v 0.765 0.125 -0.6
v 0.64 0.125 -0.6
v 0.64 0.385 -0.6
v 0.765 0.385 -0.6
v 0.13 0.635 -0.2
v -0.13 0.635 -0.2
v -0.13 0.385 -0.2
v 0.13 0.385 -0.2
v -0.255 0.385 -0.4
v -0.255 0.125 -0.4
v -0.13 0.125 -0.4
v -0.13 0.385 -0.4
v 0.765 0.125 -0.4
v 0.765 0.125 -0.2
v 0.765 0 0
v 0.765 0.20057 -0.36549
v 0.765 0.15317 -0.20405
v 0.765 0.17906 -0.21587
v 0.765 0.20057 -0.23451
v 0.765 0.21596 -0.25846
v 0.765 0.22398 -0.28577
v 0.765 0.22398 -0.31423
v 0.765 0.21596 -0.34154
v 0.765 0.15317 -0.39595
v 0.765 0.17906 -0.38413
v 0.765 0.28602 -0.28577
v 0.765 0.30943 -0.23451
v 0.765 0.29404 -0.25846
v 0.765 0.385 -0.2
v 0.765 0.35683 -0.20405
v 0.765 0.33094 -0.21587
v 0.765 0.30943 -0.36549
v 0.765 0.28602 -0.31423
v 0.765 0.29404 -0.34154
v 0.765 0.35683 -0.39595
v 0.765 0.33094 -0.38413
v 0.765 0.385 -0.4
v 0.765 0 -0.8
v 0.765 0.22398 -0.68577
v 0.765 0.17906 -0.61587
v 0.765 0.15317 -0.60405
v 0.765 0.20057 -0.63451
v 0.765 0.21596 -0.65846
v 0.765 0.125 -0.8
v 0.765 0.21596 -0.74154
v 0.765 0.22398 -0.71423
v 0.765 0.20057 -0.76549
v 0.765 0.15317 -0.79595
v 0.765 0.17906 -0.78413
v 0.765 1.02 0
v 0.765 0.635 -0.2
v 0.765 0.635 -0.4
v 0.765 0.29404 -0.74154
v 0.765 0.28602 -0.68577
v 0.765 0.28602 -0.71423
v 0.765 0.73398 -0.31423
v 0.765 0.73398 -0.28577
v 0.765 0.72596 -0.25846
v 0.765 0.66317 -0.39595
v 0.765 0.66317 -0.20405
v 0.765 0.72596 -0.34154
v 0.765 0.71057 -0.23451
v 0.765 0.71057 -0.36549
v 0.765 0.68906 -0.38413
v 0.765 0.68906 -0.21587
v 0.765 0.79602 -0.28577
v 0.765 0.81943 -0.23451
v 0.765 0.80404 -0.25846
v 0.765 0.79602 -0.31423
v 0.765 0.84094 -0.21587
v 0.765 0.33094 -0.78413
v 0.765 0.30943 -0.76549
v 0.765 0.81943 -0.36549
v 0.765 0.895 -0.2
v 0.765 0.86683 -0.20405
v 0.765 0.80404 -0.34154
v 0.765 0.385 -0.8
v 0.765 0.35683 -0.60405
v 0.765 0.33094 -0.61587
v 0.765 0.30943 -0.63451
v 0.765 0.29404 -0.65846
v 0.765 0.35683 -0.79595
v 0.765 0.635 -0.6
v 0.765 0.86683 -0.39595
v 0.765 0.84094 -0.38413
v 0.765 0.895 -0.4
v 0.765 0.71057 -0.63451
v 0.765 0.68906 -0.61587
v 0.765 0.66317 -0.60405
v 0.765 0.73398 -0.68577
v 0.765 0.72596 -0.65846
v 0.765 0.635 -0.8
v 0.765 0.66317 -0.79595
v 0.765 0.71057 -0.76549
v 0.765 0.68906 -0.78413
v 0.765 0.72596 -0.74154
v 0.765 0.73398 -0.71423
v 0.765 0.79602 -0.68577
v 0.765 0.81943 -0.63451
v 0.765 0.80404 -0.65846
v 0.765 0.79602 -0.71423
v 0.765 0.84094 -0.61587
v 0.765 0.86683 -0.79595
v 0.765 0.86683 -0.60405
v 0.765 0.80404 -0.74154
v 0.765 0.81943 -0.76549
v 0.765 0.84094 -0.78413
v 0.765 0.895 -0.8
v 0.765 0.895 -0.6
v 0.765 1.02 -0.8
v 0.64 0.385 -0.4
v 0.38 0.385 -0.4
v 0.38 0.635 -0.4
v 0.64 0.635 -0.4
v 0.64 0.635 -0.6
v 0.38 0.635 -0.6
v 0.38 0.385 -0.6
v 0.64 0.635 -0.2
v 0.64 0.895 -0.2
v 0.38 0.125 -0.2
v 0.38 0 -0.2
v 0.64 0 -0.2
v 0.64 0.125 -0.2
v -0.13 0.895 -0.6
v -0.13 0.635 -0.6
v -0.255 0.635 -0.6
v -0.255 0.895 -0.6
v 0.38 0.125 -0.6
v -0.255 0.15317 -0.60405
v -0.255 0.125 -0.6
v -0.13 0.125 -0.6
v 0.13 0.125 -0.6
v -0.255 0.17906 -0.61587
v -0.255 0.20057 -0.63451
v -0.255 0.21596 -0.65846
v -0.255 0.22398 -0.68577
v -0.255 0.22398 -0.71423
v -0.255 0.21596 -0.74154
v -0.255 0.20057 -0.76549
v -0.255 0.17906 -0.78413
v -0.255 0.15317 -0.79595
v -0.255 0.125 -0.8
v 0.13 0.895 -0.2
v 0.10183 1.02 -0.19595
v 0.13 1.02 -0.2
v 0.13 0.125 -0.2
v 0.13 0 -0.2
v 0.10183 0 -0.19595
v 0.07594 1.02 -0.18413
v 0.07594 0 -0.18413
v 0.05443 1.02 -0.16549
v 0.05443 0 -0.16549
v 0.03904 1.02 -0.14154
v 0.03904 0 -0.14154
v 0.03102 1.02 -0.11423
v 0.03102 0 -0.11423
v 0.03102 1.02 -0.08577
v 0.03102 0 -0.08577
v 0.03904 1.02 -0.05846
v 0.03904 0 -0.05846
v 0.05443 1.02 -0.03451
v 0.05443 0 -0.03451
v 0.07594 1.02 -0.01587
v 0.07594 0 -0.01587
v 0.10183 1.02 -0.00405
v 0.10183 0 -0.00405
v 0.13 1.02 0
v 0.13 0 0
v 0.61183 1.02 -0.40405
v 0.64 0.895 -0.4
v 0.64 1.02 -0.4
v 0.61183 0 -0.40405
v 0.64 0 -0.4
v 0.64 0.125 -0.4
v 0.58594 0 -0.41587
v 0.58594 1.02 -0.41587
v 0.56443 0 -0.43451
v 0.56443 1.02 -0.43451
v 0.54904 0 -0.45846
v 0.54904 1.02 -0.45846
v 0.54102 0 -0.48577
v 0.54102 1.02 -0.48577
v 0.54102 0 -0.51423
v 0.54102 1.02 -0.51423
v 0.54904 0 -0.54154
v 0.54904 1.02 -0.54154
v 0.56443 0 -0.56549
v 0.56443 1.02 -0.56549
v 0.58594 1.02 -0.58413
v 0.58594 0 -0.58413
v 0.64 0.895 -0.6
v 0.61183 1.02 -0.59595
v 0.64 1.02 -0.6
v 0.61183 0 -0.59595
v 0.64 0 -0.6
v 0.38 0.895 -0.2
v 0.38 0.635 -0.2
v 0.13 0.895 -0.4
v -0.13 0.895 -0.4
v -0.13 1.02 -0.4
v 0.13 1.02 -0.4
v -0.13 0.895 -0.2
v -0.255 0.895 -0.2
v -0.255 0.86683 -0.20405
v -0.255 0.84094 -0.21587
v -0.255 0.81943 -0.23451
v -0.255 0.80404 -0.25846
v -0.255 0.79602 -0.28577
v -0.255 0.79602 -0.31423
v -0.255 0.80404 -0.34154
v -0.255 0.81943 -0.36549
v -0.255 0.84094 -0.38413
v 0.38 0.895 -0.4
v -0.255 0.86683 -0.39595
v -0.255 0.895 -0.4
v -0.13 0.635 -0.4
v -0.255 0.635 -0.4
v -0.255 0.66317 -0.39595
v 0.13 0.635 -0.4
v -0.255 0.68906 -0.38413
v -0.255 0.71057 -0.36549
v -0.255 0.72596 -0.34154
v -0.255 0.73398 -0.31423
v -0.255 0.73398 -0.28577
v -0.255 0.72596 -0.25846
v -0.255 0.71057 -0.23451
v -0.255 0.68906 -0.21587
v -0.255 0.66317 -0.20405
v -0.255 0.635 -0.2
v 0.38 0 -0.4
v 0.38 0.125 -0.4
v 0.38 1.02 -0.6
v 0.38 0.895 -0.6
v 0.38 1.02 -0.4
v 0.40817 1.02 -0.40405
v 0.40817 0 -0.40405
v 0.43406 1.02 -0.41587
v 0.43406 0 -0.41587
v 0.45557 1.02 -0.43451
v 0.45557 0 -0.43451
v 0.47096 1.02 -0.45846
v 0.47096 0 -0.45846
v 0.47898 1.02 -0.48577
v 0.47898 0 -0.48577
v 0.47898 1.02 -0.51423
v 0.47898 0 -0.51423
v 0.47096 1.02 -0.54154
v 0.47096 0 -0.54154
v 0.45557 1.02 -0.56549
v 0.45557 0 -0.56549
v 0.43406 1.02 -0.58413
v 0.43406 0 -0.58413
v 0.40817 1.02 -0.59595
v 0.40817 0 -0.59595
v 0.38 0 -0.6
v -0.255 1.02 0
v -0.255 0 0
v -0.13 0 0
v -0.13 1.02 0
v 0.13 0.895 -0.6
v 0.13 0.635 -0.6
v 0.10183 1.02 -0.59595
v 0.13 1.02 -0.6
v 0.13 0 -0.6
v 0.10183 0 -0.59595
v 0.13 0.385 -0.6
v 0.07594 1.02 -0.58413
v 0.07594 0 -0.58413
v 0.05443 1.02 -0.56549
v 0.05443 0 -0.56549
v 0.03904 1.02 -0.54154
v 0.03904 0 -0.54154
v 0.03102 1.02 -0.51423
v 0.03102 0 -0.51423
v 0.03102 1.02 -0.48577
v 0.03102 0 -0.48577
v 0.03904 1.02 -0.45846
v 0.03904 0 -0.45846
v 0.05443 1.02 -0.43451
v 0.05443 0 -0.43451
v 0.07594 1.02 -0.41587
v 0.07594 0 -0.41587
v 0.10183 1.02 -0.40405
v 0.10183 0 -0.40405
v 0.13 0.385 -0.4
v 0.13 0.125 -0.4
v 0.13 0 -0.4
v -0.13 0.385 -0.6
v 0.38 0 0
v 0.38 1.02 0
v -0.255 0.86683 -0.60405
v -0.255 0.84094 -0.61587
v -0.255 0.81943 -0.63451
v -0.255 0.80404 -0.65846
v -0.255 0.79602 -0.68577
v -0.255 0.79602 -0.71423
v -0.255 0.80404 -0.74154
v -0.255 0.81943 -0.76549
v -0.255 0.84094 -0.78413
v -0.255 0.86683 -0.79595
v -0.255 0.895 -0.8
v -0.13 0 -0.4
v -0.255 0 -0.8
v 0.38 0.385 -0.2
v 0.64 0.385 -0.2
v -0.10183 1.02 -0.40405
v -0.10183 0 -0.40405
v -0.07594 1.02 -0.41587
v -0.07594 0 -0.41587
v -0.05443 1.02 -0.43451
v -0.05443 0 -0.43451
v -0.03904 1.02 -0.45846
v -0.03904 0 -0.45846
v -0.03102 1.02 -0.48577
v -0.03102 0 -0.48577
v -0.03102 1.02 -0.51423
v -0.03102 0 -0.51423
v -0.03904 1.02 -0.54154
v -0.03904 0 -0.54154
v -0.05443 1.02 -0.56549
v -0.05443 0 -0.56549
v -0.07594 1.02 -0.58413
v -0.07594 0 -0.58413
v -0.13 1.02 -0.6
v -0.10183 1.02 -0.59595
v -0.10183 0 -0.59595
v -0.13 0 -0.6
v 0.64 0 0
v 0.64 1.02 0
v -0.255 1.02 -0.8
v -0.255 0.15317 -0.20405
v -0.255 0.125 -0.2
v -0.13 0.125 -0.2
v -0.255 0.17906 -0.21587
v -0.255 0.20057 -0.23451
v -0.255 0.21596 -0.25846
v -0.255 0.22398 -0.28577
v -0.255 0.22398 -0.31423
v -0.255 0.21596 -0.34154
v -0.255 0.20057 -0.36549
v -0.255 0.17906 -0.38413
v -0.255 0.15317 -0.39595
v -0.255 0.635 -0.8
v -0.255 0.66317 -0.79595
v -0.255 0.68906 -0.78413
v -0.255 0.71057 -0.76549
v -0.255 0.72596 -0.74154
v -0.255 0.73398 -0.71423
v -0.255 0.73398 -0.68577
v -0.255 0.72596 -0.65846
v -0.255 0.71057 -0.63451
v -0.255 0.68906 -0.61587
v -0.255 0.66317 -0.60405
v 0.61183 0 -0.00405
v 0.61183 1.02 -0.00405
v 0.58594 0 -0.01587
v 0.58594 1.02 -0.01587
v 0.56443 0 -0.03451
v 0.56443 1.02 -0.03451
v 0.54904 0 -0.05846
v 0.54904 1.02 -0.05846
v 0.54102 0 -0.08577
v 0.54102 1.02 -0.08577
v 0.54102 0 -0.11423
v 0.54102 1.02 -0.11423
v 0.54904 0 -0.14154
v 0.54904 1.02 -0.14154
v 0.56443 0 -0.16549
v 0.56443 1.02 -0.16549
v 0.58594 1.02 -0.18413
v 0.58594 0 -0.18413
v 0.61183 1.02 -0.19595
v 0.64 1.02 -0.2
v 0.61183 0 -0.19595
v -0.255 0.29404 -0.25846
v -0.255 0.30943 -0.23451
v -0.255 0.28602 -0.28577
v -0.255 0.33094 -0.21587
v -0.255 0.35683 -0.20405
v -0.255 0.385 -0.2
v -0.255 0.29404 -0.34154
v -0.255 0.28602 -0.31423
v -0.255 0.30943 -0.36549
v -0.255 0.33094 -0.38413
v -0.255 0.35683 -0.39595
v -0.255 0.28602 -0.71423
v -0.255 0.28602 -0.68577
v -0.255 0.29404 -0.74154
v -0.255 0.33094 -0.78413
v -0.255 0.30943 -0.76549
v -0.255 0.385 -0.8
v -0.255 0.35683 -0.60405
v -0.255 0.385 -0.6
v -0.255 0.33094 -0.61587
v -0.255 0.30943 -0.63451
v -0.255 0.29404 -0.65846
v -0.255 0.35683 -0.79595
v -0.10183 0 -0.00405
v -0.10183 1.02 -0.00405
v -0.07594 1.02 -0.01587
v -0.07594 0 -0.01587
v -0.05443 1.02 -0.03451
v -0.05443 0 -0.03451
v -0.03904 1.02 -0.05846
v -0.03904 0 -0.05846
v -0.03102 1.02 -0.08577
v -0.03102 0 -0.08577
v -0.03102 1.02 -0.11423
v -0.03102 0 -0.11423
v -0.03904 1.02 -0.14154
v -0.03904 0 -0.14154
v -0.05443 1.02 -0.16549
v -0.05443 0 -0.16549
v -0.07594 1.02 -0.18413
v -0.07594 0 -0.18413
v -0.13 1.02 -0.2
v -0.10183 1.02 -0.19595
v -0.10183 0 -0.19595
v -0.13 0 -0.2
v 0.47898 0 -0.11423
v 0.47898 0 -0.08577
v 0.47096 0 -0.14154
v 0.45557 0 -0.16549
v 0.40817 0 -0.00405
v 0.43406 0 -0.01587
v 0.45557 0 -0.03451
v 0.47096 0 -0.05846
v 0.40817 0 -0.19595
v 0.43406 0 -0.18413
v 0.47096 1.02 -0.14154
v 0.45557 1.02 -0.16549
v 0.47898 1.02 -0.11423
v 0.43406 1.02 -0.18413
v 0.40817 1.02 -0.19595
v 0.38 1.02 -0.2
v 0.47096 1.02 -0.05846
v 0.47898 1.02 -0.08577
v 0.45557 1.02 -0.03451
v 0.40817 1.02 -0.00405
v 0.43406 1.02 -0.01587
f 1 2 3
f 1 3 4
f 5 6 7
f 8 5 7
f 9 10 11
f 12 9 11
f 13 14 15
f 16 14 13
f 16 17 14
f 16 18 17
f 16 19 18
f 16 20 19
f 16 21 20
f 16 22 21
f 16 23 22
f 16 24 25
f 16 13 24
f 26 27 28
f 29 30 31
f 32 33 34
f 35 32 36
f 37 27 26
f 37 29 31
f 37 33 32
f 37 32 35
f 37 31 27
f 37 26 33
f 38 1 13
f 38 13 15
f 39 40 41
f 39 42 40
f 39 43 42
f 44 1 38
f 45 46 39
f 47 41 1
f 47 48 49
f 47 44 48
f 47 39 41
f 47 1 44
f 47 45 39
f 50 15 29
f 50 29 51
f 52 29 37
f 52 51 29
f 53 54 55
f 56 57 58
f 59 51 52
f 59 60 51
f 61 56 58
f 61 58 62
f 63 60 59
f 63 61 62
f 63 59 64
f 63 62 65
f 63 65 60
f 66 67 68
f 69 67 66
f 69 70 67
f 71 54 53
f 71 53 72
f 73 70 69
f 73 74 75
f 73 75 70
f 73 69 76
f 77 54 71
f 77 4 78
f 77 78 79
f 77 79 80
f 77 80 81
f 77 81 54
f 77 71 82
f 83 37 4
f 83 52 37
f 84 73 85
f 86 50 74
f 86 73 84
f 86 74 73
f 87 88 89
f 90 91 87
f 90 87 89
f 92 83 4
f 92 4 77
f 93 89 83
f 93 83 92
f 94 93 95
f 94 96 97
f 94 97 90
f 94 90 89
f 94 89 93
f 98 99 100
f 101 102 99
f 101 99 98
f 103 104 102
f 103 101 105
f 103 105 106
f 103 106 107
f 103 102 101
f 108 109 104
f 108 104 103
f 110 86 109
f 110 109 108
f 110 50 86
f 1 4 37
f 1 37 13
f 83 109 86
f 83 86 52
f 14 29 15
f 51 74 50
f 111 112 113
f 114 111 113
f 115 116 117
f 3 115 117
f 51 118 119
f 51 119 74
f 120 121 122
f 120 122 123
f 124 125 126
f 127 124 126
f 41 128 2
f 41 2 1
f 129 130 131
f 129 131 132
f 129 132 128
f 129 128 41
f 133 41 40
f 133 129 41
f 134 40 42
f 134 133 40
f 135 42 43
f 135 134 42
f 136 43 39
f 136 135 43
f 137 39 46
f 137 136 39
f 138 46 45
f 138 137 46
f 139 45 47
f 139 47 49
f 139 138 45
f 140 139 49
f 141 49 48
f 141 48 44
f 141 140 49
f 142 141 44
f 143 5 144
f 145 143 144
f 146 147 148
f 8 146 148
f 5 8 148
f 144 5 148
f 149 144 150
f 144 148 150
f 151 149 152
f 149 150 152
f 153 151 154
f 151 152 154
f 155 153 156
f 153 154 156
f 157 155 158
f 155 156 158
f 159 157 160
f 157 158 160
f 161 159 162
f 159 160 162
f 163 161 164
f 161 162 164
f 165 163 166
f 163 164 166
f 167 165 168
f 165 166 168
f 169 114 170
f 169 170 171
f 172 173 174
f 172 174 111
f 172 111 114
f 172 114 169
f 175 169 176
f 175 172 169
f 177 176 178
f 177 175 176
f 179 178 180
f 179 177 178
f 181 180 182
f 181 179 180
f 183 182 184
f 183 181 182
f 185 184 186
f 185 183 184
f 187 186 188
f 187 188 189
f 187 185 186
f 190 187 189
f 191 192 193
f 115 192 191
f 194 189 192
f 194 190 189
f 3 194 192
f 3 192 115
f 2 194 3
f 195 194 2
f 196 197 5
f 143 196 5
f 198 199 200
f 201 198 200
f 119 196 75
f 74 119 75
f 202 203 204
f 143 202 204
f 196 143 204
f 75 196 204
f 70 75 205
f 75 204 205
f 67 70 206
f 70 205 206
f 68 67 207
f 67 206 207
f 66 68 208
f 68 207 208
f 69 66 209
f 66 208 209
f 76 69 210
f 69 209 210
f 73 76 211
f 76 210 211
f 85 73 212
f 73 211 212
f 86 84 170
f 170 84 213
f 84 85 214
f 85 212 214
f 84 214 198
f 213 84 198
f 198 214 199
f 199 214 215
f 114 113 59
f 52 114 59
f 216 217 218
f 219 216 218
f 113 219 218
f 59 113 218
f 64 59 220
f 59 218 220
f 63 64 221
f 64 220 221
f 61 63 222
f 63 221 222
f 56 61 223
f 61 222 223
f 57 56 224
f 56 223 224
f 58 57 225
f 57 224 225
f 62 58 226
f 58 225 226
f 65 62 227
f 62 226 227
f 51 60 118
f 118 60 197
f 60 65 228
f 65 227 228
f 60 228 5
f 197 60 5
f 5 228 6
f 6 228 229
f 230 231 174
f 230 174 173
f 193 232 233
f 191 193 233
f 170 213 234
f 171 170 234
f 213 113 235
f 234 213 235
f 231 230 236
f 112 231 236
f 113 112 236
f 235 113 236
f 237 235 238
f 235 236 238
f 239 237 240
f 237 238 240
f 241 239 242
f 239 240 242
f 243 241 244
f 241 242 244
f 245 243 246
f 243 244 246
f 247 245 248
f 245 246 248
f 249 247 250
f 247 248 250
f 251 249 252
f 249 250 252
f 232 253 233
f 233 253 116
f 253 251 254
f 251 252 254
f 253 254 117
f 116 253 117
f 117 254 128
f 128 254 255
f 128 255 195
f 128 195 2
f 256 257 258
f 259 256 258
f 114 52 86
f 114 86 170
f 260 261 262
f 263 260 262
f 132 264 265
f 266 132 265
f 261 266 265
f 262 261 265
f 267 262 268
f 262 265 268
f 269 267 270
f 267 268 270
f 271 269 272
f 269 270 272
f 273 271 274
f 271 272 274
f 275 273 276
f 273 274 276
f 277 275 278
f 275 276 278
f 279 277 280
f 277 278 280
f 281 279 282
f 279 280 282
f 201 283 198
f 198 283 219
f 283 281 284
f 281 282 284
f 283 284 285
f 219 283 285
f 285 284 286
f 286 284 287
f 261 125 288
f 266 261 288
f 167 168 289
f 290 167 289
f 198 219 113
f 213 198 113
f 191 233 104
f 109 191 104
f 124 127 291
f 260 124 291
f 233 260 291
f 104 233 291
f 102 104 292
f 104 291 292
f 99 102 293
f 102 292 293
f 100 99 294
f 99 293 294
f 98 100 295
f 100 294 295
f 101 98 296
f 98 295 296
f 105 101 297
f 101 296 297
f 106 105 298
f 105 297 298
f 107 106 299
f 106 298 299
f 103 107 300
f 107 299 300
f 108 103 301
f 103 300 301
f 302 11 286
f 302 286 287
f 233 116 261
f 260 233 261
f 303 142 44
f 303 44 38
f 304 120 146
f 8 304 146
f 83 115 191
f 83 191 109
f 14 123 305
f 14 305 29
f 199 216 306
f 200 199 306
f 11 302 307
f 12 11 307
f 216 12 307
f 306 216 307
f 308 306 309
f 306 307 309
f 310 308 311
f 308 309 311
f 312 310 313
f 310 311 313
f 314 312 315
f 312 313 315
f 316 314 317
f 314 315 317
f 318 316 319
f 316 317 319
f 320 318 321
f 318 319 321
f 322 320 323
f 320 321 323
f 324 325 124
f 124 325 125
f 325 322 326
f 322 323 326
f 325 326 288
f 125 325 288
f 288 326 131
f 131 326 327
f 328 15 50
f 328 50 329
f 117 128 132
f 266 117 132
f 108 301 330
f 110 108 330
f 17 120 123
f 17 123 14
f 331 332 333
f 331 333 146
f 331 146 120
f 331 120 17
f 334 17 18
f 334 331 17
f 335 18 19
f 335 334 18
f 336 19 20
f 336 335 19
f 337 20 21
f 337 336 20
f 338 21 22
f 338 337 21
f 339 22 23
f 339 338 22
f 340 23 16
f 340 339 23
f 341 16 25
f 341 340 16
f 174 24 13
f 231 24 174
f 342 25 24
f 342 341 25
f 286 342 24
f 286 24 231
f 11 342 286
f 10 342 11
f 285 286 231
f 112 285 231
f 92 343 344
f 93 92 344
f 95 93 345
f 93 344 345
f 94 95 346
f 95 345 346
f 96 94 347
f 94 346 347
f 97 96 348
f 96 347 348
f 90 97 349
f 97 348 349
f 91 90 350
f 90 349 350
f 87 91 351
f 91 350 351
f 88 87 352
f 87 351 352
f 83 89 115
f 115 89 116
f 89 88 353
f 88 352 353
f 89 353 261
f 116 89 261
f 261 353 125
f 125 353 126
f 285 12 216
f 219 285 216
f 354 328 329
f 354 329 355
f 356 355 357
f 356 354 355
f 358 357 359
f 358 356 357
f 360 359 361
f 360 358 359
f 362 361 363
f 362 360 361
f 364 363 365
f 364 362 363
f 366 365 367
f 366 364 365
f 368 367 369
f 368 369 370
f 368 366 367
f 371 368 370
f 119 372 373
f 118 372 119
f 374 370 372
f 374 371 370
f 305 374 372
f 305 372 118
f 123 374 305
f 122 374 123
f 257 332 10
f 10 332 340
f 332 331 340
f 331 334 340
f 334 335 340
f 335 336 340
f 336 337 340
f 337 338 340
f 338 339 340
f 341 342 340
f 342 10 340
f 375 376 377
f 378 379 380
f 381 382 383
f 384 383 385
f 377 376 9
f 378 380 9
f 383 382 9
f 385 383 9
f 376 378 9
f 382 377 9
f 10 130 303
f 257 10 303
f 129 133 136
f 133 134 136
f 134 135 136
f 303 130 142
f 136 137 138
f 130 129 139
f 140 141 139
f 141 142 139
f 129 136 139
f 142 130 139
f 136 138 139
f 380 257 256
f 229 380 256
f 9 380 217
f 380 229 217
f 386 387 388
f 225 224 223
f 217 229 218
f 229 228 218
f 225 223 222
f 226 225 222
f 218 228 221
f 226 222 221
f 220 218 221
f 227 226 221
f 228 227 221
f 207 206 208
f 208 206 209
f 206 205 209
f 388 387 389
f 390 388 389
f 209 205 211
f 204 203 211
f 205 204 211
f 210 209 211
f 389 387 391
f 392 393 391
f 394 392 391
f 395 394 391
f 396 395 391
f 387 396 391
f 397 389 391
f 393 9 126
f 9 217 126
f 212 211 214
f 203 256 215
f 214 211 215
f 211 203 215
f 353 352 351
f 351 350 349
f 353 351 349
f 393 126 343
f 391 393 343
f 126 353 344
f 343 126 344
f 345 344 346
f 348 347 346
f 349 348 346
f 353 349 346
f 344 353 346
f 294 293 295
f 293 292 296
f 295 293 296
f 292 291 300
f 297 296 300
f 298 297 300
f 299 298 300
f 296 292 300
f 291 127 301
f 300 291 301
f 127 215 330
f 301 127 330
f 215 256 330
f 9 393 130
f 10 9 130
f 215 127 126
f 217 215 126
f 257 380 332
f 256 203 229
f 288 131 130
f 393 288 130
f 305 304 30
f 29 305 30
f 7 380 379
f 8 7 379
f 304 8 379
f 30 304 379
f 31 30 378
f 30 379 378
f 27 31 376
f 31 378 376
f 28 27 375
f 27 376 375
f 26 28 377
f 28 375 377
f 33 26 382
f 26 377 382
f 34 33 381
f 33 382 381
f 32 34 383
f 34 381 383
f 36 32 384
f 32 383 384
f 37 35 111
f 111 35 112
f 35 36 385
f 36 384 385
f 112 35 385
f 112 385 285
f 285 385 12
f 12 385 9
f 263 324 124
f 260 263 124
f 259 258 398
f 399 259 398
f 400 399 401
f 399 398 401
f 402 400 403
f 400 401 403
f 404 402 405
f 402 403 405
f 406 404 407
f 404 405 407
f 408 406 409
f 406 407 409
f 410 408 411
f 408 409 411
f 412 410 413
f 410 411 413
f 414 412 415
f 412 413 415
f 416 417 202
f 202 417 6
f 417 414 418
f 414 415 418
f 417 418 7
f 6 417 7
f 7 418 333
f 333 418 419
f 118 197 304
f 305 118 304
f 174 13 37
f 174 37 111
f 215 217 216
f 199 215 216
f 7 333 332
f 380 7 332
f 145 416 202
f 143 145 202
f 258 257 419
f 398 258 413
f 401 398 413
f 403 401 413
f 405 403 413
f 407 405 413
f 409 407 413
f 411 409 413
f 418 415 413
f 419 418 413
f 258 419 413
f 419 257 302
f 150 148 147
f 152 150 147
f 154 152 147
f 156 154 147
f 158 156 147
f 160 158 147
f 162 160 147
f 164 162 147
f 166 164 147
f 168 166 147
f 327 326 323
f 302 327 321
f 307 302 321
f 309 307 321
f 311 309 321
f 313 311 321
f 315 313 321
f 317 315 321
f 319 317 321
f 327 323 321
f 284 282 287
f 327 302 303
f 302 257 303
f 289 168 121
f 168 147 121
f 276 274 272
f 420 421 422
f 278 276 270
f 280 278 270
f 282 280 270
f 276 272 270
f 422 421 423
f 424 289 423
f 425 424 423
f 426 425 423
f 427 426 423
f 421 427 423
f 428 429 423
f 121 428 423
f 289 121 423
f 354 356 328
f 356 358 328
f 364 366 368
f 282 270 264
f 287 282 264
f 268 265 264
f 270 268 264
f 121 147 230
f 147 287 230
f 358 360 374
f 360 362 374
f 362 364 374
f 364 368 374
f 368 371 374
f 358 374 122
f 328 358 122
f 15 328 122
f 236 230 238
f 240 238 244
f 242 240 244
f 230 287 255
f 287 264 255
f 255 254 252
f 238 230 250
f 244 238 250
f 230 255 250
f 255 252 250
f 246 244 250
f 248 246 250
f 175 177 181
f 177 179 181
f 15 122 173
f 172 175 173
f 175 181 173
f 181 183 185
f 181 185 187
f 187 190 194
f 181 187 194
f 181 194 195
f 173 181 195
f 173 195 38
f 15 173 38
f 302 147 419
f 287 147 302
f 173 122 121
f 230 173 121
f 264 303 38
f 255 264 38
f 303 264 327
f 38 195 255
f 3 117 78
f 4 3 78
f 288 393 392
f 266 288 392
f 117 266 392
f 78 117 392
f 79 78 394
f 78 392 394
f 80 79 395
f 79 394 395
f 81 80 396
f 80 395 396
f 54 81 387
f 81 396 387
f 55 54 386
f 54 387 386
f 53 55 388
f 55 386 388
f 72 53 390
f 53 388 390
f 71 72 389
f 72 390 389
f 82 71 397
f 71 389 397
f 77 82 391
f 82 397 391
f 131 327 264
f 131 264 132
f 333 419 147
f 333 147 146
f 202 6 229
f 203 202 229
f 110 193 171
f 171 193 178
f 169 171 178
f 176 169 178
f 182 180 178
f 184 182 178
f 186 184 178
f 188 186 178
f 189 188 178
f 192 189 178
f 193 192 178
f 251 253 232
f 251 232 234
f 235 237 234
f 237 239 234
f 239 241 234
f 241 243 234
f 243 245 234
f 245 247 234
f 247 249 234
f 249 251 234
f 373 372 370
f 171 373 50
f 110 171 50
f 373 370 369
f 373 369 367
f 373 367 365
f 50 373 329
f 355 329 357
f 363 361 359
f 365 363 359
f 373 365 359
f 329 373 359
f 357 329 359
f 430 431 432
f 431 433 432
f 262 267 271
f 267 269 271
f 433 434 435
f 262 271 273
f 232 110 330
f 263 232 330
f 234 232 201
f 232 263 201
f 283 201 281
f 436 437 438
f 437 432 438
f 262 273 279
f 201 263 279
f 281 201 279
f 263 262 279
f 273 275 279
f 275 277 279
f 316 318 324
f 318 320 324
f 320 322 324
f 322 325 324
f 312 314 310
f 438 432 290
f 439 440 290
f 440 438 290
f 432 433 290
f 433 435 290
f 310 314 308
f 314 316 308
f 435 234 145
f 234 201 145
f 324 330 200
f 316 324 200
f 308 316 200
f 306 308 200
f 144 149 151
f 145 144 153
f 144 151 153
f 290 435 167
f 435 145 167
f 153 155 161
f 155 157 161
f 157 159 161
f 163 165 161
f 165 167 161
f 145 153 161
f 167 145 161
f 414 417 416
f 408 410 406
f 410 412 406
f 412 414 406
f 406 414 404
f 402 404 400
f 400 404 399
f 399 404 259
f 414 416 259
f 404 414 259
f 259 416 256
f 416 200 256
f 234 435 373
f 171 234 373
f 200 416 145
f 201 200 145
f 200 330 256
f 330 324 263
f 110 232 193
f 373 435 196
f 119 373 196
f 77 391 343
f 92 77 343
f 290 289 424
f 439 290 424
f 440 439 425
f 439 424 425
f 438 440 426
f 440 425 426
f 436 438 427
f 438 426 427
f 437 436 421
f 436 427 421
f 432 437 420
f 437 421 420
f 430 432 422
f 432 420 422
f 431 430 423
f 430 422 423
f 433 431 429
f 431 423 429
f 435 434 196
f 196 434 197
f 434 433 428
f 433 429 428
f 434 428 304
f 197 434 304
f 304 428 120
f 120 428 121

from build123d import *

# Parameters (mm, degrees)
DODANIE_WYCI_GNI_CIE1_DEPTH = 1.02
DODANIE_WYCI_GNI_CIE2_START = -0.255
DODANIE_WYCI_GNI_CIE2_DEPTH = 1.02


with BuildPart() as part:
    # Szkic1 → Dodanie-wyciągnięcie1 (new body)
    with BuildSketch(Plane(origin=(0, 0, 0), x_dir=(1, 0, 0), z_dir=(0, 1, 0))):
        with BuildLine():
            Line((-0.255, 0), (-0.13, 0))
            ThreePointArc((-0.13, 0), (-0.03, 0.1), (-0.13, 0.2))
            Line((-0.13, 0.2), (-0.255, 0.2))
            Line((-0.255, 0.2), (-0.255, 0))
        make_face()
        with BuildLine():
            Line((-0.255, 0.4), (-0.13, 0.4))
            ThreePointArc((-0.13, 0.4), (-0.03, 0.5), (-0.13, 0.6))
            Line((-0.13, 0.6), (-0.255, 0.6))
            Line((-0.255, 0.6), (-0.255, 0.4))
        make_face()
        with BuildLine():
            Line((0.255, 0.4), (0.255, 0.6))
            Line((0.255, 0.6), (0.13, 0.6))
            ThreePointArc((0.13, 0.6), (0.03, 0.5), (0.13, 0.4))
            Line((0.13, 0.4), (0.255, 0.4))
        make_face()
        with BuildLine():
            Line((0.38, 0.6), (0.255, 0.6))
            Line((0.255, 0.6), (0.255, 0.4))
            Line((0.255, 0.4), (0.38, 0.4))
            ThreePointArc((0.38, 0.4), (0.48, 0.5), (0.38, 0.6))
        make_face()
        with BuildLine():
            Line((0.38, 0.2), (0.255, 0.2))
            Line((0.255, 0.2), (0.255, 0))
            Line((0.255, 0), (0.38, 0))
            ThreePointArc((0.38, 0), (0.48, 0.1), (0.38, 0.2))
        make_face()
        with BuildLine():
            Line((0.255, 0.2), (0.13, 0.2))
            ThreePointArc((0.13, 0.2), (0.03, 0.1), (0.13, 0))
            Line((0.13, 0), (0.255, 0))
            Line((0.255, 0), (0.255, 0.2))
        make_face()
        with BuildLine():
            ThreePointArc((0.64, 0), (0.54, 0.1), (0.64, 0.2))
            Line((0.64, 0.2), (0.765, 0.2))
            Line((0.765, 0.2), (0.765, 0))
            Line((0.765, 0), (0.64, 0))
        make_face()
        with BuildLine():
            ThreePointArc((0.64, 0.4), (0.54, 0.5), (0.64, 0.6))
            Line((0.64, 0.6), (0.765, 0.6))
            Line((0.765, 0.6), (0.765, 0.4))
            Line((0.765, 0.4), (0.64, 0.4))
        make_face()
    extrude(amount=DODANIE_WYCI_GNI_CIE1_DEPTH)

    # Szkic4 → Dodanie-wyciągnięcie2 (add)
    with BuildSketch(Plane(origin=(0, 0, 0), x_dir=(0, 0, -1), z_dir=(1, 0, 0)).offset(DODANIE_WYCI_GNI_CIE2_START)):
        with BuildLine():
            Line((0.6, 1.02), (0.6, 0.895))
            ThreePointArc((0.6, 0.895), (0.7, 0.795), (0.8, 0.895))
            Line((0.8, 0.895), (0.8, 1.02))
            Line((0.8, 1.02), (0.6, 1.02))
        make_face()
        with BuildLine():
            ThreePointArc((0.8, 0.635), (0.7, 0.735), (0.6, 0.635))
            Line((0.6, 0.635), (0.6, 0.51))
            Line((0.6, 0.51), (0.8, 0.51))
            Line((0.8, 0.51), (0.8, 0.635))
        make_face()
        with BuildLine():
            Line((0.8, 0.51), (0.6, 0.51))
            Line((0.6, 0.51), (0.6, 0.385))
            ThreePointArc((0.6, 0.385), (0.7, 0.285), (0.8, 0.385))
            Line((0.8, 0.385), (0.8, 0.51))
        make_face()
        with BuildLine():
            ThreePointArc((0.6, 0.125), (0.7, 0.225), (0.8, 0.125))
            Line((0.8, 0.125), (0.8, 0))
            Line((0.8, 0), (0.6, 0))
            Line((0.6, 0), (0.6, 0.125))
        make_face()
        with BuildLine():
            ThreePointArc((0.2, 0.125), (0.3, 0.225), (0.4, 0.125))
            Line((0.4, 0.125), (0.4, 0))
            Line((0.4, 0), (0.2, 0))
            Line((0.2, 0), (0.2, 0.125))
        make_face()
        with BuildLine():
            Line((0.4, 0.51), (0.2, 0.51))
            Line((0.2, 0.51), (0.2, 0.385))
            ThreePointArc((0.2, 0.385), (0.3, 0.285), (0.4, 0.385))
            Line((0.4, 0.385), (0.4, 0.51))
        make_face()
        with BuildLine():
            Line((0.2, 0.635), (0.2, 0.51))
            Line((0.2, 0.51), (0.4, 0.51))
            Line((0.4, 0.51), (0.4, 0.635))
            ThreePointArc((0.4, 0.635), (0.3, 0.735), (0.2, 0.635))
        make_face()
        with BuildLine():
            Line((0.2, 1.02), (0.2, 0.895))
            ThreePointArc((0.2, 0.895), (0.3, 0.795), (0.4, 0.895))
            Line((0.4, 0.895), (0.4, 1.02))
            Line((0.4, 1.02), (0.2, 1.02))
        make_face()
    extrude(amount=DODANIE_WYCI_GNI_CIE2_DEPTH)


solid = part.part
